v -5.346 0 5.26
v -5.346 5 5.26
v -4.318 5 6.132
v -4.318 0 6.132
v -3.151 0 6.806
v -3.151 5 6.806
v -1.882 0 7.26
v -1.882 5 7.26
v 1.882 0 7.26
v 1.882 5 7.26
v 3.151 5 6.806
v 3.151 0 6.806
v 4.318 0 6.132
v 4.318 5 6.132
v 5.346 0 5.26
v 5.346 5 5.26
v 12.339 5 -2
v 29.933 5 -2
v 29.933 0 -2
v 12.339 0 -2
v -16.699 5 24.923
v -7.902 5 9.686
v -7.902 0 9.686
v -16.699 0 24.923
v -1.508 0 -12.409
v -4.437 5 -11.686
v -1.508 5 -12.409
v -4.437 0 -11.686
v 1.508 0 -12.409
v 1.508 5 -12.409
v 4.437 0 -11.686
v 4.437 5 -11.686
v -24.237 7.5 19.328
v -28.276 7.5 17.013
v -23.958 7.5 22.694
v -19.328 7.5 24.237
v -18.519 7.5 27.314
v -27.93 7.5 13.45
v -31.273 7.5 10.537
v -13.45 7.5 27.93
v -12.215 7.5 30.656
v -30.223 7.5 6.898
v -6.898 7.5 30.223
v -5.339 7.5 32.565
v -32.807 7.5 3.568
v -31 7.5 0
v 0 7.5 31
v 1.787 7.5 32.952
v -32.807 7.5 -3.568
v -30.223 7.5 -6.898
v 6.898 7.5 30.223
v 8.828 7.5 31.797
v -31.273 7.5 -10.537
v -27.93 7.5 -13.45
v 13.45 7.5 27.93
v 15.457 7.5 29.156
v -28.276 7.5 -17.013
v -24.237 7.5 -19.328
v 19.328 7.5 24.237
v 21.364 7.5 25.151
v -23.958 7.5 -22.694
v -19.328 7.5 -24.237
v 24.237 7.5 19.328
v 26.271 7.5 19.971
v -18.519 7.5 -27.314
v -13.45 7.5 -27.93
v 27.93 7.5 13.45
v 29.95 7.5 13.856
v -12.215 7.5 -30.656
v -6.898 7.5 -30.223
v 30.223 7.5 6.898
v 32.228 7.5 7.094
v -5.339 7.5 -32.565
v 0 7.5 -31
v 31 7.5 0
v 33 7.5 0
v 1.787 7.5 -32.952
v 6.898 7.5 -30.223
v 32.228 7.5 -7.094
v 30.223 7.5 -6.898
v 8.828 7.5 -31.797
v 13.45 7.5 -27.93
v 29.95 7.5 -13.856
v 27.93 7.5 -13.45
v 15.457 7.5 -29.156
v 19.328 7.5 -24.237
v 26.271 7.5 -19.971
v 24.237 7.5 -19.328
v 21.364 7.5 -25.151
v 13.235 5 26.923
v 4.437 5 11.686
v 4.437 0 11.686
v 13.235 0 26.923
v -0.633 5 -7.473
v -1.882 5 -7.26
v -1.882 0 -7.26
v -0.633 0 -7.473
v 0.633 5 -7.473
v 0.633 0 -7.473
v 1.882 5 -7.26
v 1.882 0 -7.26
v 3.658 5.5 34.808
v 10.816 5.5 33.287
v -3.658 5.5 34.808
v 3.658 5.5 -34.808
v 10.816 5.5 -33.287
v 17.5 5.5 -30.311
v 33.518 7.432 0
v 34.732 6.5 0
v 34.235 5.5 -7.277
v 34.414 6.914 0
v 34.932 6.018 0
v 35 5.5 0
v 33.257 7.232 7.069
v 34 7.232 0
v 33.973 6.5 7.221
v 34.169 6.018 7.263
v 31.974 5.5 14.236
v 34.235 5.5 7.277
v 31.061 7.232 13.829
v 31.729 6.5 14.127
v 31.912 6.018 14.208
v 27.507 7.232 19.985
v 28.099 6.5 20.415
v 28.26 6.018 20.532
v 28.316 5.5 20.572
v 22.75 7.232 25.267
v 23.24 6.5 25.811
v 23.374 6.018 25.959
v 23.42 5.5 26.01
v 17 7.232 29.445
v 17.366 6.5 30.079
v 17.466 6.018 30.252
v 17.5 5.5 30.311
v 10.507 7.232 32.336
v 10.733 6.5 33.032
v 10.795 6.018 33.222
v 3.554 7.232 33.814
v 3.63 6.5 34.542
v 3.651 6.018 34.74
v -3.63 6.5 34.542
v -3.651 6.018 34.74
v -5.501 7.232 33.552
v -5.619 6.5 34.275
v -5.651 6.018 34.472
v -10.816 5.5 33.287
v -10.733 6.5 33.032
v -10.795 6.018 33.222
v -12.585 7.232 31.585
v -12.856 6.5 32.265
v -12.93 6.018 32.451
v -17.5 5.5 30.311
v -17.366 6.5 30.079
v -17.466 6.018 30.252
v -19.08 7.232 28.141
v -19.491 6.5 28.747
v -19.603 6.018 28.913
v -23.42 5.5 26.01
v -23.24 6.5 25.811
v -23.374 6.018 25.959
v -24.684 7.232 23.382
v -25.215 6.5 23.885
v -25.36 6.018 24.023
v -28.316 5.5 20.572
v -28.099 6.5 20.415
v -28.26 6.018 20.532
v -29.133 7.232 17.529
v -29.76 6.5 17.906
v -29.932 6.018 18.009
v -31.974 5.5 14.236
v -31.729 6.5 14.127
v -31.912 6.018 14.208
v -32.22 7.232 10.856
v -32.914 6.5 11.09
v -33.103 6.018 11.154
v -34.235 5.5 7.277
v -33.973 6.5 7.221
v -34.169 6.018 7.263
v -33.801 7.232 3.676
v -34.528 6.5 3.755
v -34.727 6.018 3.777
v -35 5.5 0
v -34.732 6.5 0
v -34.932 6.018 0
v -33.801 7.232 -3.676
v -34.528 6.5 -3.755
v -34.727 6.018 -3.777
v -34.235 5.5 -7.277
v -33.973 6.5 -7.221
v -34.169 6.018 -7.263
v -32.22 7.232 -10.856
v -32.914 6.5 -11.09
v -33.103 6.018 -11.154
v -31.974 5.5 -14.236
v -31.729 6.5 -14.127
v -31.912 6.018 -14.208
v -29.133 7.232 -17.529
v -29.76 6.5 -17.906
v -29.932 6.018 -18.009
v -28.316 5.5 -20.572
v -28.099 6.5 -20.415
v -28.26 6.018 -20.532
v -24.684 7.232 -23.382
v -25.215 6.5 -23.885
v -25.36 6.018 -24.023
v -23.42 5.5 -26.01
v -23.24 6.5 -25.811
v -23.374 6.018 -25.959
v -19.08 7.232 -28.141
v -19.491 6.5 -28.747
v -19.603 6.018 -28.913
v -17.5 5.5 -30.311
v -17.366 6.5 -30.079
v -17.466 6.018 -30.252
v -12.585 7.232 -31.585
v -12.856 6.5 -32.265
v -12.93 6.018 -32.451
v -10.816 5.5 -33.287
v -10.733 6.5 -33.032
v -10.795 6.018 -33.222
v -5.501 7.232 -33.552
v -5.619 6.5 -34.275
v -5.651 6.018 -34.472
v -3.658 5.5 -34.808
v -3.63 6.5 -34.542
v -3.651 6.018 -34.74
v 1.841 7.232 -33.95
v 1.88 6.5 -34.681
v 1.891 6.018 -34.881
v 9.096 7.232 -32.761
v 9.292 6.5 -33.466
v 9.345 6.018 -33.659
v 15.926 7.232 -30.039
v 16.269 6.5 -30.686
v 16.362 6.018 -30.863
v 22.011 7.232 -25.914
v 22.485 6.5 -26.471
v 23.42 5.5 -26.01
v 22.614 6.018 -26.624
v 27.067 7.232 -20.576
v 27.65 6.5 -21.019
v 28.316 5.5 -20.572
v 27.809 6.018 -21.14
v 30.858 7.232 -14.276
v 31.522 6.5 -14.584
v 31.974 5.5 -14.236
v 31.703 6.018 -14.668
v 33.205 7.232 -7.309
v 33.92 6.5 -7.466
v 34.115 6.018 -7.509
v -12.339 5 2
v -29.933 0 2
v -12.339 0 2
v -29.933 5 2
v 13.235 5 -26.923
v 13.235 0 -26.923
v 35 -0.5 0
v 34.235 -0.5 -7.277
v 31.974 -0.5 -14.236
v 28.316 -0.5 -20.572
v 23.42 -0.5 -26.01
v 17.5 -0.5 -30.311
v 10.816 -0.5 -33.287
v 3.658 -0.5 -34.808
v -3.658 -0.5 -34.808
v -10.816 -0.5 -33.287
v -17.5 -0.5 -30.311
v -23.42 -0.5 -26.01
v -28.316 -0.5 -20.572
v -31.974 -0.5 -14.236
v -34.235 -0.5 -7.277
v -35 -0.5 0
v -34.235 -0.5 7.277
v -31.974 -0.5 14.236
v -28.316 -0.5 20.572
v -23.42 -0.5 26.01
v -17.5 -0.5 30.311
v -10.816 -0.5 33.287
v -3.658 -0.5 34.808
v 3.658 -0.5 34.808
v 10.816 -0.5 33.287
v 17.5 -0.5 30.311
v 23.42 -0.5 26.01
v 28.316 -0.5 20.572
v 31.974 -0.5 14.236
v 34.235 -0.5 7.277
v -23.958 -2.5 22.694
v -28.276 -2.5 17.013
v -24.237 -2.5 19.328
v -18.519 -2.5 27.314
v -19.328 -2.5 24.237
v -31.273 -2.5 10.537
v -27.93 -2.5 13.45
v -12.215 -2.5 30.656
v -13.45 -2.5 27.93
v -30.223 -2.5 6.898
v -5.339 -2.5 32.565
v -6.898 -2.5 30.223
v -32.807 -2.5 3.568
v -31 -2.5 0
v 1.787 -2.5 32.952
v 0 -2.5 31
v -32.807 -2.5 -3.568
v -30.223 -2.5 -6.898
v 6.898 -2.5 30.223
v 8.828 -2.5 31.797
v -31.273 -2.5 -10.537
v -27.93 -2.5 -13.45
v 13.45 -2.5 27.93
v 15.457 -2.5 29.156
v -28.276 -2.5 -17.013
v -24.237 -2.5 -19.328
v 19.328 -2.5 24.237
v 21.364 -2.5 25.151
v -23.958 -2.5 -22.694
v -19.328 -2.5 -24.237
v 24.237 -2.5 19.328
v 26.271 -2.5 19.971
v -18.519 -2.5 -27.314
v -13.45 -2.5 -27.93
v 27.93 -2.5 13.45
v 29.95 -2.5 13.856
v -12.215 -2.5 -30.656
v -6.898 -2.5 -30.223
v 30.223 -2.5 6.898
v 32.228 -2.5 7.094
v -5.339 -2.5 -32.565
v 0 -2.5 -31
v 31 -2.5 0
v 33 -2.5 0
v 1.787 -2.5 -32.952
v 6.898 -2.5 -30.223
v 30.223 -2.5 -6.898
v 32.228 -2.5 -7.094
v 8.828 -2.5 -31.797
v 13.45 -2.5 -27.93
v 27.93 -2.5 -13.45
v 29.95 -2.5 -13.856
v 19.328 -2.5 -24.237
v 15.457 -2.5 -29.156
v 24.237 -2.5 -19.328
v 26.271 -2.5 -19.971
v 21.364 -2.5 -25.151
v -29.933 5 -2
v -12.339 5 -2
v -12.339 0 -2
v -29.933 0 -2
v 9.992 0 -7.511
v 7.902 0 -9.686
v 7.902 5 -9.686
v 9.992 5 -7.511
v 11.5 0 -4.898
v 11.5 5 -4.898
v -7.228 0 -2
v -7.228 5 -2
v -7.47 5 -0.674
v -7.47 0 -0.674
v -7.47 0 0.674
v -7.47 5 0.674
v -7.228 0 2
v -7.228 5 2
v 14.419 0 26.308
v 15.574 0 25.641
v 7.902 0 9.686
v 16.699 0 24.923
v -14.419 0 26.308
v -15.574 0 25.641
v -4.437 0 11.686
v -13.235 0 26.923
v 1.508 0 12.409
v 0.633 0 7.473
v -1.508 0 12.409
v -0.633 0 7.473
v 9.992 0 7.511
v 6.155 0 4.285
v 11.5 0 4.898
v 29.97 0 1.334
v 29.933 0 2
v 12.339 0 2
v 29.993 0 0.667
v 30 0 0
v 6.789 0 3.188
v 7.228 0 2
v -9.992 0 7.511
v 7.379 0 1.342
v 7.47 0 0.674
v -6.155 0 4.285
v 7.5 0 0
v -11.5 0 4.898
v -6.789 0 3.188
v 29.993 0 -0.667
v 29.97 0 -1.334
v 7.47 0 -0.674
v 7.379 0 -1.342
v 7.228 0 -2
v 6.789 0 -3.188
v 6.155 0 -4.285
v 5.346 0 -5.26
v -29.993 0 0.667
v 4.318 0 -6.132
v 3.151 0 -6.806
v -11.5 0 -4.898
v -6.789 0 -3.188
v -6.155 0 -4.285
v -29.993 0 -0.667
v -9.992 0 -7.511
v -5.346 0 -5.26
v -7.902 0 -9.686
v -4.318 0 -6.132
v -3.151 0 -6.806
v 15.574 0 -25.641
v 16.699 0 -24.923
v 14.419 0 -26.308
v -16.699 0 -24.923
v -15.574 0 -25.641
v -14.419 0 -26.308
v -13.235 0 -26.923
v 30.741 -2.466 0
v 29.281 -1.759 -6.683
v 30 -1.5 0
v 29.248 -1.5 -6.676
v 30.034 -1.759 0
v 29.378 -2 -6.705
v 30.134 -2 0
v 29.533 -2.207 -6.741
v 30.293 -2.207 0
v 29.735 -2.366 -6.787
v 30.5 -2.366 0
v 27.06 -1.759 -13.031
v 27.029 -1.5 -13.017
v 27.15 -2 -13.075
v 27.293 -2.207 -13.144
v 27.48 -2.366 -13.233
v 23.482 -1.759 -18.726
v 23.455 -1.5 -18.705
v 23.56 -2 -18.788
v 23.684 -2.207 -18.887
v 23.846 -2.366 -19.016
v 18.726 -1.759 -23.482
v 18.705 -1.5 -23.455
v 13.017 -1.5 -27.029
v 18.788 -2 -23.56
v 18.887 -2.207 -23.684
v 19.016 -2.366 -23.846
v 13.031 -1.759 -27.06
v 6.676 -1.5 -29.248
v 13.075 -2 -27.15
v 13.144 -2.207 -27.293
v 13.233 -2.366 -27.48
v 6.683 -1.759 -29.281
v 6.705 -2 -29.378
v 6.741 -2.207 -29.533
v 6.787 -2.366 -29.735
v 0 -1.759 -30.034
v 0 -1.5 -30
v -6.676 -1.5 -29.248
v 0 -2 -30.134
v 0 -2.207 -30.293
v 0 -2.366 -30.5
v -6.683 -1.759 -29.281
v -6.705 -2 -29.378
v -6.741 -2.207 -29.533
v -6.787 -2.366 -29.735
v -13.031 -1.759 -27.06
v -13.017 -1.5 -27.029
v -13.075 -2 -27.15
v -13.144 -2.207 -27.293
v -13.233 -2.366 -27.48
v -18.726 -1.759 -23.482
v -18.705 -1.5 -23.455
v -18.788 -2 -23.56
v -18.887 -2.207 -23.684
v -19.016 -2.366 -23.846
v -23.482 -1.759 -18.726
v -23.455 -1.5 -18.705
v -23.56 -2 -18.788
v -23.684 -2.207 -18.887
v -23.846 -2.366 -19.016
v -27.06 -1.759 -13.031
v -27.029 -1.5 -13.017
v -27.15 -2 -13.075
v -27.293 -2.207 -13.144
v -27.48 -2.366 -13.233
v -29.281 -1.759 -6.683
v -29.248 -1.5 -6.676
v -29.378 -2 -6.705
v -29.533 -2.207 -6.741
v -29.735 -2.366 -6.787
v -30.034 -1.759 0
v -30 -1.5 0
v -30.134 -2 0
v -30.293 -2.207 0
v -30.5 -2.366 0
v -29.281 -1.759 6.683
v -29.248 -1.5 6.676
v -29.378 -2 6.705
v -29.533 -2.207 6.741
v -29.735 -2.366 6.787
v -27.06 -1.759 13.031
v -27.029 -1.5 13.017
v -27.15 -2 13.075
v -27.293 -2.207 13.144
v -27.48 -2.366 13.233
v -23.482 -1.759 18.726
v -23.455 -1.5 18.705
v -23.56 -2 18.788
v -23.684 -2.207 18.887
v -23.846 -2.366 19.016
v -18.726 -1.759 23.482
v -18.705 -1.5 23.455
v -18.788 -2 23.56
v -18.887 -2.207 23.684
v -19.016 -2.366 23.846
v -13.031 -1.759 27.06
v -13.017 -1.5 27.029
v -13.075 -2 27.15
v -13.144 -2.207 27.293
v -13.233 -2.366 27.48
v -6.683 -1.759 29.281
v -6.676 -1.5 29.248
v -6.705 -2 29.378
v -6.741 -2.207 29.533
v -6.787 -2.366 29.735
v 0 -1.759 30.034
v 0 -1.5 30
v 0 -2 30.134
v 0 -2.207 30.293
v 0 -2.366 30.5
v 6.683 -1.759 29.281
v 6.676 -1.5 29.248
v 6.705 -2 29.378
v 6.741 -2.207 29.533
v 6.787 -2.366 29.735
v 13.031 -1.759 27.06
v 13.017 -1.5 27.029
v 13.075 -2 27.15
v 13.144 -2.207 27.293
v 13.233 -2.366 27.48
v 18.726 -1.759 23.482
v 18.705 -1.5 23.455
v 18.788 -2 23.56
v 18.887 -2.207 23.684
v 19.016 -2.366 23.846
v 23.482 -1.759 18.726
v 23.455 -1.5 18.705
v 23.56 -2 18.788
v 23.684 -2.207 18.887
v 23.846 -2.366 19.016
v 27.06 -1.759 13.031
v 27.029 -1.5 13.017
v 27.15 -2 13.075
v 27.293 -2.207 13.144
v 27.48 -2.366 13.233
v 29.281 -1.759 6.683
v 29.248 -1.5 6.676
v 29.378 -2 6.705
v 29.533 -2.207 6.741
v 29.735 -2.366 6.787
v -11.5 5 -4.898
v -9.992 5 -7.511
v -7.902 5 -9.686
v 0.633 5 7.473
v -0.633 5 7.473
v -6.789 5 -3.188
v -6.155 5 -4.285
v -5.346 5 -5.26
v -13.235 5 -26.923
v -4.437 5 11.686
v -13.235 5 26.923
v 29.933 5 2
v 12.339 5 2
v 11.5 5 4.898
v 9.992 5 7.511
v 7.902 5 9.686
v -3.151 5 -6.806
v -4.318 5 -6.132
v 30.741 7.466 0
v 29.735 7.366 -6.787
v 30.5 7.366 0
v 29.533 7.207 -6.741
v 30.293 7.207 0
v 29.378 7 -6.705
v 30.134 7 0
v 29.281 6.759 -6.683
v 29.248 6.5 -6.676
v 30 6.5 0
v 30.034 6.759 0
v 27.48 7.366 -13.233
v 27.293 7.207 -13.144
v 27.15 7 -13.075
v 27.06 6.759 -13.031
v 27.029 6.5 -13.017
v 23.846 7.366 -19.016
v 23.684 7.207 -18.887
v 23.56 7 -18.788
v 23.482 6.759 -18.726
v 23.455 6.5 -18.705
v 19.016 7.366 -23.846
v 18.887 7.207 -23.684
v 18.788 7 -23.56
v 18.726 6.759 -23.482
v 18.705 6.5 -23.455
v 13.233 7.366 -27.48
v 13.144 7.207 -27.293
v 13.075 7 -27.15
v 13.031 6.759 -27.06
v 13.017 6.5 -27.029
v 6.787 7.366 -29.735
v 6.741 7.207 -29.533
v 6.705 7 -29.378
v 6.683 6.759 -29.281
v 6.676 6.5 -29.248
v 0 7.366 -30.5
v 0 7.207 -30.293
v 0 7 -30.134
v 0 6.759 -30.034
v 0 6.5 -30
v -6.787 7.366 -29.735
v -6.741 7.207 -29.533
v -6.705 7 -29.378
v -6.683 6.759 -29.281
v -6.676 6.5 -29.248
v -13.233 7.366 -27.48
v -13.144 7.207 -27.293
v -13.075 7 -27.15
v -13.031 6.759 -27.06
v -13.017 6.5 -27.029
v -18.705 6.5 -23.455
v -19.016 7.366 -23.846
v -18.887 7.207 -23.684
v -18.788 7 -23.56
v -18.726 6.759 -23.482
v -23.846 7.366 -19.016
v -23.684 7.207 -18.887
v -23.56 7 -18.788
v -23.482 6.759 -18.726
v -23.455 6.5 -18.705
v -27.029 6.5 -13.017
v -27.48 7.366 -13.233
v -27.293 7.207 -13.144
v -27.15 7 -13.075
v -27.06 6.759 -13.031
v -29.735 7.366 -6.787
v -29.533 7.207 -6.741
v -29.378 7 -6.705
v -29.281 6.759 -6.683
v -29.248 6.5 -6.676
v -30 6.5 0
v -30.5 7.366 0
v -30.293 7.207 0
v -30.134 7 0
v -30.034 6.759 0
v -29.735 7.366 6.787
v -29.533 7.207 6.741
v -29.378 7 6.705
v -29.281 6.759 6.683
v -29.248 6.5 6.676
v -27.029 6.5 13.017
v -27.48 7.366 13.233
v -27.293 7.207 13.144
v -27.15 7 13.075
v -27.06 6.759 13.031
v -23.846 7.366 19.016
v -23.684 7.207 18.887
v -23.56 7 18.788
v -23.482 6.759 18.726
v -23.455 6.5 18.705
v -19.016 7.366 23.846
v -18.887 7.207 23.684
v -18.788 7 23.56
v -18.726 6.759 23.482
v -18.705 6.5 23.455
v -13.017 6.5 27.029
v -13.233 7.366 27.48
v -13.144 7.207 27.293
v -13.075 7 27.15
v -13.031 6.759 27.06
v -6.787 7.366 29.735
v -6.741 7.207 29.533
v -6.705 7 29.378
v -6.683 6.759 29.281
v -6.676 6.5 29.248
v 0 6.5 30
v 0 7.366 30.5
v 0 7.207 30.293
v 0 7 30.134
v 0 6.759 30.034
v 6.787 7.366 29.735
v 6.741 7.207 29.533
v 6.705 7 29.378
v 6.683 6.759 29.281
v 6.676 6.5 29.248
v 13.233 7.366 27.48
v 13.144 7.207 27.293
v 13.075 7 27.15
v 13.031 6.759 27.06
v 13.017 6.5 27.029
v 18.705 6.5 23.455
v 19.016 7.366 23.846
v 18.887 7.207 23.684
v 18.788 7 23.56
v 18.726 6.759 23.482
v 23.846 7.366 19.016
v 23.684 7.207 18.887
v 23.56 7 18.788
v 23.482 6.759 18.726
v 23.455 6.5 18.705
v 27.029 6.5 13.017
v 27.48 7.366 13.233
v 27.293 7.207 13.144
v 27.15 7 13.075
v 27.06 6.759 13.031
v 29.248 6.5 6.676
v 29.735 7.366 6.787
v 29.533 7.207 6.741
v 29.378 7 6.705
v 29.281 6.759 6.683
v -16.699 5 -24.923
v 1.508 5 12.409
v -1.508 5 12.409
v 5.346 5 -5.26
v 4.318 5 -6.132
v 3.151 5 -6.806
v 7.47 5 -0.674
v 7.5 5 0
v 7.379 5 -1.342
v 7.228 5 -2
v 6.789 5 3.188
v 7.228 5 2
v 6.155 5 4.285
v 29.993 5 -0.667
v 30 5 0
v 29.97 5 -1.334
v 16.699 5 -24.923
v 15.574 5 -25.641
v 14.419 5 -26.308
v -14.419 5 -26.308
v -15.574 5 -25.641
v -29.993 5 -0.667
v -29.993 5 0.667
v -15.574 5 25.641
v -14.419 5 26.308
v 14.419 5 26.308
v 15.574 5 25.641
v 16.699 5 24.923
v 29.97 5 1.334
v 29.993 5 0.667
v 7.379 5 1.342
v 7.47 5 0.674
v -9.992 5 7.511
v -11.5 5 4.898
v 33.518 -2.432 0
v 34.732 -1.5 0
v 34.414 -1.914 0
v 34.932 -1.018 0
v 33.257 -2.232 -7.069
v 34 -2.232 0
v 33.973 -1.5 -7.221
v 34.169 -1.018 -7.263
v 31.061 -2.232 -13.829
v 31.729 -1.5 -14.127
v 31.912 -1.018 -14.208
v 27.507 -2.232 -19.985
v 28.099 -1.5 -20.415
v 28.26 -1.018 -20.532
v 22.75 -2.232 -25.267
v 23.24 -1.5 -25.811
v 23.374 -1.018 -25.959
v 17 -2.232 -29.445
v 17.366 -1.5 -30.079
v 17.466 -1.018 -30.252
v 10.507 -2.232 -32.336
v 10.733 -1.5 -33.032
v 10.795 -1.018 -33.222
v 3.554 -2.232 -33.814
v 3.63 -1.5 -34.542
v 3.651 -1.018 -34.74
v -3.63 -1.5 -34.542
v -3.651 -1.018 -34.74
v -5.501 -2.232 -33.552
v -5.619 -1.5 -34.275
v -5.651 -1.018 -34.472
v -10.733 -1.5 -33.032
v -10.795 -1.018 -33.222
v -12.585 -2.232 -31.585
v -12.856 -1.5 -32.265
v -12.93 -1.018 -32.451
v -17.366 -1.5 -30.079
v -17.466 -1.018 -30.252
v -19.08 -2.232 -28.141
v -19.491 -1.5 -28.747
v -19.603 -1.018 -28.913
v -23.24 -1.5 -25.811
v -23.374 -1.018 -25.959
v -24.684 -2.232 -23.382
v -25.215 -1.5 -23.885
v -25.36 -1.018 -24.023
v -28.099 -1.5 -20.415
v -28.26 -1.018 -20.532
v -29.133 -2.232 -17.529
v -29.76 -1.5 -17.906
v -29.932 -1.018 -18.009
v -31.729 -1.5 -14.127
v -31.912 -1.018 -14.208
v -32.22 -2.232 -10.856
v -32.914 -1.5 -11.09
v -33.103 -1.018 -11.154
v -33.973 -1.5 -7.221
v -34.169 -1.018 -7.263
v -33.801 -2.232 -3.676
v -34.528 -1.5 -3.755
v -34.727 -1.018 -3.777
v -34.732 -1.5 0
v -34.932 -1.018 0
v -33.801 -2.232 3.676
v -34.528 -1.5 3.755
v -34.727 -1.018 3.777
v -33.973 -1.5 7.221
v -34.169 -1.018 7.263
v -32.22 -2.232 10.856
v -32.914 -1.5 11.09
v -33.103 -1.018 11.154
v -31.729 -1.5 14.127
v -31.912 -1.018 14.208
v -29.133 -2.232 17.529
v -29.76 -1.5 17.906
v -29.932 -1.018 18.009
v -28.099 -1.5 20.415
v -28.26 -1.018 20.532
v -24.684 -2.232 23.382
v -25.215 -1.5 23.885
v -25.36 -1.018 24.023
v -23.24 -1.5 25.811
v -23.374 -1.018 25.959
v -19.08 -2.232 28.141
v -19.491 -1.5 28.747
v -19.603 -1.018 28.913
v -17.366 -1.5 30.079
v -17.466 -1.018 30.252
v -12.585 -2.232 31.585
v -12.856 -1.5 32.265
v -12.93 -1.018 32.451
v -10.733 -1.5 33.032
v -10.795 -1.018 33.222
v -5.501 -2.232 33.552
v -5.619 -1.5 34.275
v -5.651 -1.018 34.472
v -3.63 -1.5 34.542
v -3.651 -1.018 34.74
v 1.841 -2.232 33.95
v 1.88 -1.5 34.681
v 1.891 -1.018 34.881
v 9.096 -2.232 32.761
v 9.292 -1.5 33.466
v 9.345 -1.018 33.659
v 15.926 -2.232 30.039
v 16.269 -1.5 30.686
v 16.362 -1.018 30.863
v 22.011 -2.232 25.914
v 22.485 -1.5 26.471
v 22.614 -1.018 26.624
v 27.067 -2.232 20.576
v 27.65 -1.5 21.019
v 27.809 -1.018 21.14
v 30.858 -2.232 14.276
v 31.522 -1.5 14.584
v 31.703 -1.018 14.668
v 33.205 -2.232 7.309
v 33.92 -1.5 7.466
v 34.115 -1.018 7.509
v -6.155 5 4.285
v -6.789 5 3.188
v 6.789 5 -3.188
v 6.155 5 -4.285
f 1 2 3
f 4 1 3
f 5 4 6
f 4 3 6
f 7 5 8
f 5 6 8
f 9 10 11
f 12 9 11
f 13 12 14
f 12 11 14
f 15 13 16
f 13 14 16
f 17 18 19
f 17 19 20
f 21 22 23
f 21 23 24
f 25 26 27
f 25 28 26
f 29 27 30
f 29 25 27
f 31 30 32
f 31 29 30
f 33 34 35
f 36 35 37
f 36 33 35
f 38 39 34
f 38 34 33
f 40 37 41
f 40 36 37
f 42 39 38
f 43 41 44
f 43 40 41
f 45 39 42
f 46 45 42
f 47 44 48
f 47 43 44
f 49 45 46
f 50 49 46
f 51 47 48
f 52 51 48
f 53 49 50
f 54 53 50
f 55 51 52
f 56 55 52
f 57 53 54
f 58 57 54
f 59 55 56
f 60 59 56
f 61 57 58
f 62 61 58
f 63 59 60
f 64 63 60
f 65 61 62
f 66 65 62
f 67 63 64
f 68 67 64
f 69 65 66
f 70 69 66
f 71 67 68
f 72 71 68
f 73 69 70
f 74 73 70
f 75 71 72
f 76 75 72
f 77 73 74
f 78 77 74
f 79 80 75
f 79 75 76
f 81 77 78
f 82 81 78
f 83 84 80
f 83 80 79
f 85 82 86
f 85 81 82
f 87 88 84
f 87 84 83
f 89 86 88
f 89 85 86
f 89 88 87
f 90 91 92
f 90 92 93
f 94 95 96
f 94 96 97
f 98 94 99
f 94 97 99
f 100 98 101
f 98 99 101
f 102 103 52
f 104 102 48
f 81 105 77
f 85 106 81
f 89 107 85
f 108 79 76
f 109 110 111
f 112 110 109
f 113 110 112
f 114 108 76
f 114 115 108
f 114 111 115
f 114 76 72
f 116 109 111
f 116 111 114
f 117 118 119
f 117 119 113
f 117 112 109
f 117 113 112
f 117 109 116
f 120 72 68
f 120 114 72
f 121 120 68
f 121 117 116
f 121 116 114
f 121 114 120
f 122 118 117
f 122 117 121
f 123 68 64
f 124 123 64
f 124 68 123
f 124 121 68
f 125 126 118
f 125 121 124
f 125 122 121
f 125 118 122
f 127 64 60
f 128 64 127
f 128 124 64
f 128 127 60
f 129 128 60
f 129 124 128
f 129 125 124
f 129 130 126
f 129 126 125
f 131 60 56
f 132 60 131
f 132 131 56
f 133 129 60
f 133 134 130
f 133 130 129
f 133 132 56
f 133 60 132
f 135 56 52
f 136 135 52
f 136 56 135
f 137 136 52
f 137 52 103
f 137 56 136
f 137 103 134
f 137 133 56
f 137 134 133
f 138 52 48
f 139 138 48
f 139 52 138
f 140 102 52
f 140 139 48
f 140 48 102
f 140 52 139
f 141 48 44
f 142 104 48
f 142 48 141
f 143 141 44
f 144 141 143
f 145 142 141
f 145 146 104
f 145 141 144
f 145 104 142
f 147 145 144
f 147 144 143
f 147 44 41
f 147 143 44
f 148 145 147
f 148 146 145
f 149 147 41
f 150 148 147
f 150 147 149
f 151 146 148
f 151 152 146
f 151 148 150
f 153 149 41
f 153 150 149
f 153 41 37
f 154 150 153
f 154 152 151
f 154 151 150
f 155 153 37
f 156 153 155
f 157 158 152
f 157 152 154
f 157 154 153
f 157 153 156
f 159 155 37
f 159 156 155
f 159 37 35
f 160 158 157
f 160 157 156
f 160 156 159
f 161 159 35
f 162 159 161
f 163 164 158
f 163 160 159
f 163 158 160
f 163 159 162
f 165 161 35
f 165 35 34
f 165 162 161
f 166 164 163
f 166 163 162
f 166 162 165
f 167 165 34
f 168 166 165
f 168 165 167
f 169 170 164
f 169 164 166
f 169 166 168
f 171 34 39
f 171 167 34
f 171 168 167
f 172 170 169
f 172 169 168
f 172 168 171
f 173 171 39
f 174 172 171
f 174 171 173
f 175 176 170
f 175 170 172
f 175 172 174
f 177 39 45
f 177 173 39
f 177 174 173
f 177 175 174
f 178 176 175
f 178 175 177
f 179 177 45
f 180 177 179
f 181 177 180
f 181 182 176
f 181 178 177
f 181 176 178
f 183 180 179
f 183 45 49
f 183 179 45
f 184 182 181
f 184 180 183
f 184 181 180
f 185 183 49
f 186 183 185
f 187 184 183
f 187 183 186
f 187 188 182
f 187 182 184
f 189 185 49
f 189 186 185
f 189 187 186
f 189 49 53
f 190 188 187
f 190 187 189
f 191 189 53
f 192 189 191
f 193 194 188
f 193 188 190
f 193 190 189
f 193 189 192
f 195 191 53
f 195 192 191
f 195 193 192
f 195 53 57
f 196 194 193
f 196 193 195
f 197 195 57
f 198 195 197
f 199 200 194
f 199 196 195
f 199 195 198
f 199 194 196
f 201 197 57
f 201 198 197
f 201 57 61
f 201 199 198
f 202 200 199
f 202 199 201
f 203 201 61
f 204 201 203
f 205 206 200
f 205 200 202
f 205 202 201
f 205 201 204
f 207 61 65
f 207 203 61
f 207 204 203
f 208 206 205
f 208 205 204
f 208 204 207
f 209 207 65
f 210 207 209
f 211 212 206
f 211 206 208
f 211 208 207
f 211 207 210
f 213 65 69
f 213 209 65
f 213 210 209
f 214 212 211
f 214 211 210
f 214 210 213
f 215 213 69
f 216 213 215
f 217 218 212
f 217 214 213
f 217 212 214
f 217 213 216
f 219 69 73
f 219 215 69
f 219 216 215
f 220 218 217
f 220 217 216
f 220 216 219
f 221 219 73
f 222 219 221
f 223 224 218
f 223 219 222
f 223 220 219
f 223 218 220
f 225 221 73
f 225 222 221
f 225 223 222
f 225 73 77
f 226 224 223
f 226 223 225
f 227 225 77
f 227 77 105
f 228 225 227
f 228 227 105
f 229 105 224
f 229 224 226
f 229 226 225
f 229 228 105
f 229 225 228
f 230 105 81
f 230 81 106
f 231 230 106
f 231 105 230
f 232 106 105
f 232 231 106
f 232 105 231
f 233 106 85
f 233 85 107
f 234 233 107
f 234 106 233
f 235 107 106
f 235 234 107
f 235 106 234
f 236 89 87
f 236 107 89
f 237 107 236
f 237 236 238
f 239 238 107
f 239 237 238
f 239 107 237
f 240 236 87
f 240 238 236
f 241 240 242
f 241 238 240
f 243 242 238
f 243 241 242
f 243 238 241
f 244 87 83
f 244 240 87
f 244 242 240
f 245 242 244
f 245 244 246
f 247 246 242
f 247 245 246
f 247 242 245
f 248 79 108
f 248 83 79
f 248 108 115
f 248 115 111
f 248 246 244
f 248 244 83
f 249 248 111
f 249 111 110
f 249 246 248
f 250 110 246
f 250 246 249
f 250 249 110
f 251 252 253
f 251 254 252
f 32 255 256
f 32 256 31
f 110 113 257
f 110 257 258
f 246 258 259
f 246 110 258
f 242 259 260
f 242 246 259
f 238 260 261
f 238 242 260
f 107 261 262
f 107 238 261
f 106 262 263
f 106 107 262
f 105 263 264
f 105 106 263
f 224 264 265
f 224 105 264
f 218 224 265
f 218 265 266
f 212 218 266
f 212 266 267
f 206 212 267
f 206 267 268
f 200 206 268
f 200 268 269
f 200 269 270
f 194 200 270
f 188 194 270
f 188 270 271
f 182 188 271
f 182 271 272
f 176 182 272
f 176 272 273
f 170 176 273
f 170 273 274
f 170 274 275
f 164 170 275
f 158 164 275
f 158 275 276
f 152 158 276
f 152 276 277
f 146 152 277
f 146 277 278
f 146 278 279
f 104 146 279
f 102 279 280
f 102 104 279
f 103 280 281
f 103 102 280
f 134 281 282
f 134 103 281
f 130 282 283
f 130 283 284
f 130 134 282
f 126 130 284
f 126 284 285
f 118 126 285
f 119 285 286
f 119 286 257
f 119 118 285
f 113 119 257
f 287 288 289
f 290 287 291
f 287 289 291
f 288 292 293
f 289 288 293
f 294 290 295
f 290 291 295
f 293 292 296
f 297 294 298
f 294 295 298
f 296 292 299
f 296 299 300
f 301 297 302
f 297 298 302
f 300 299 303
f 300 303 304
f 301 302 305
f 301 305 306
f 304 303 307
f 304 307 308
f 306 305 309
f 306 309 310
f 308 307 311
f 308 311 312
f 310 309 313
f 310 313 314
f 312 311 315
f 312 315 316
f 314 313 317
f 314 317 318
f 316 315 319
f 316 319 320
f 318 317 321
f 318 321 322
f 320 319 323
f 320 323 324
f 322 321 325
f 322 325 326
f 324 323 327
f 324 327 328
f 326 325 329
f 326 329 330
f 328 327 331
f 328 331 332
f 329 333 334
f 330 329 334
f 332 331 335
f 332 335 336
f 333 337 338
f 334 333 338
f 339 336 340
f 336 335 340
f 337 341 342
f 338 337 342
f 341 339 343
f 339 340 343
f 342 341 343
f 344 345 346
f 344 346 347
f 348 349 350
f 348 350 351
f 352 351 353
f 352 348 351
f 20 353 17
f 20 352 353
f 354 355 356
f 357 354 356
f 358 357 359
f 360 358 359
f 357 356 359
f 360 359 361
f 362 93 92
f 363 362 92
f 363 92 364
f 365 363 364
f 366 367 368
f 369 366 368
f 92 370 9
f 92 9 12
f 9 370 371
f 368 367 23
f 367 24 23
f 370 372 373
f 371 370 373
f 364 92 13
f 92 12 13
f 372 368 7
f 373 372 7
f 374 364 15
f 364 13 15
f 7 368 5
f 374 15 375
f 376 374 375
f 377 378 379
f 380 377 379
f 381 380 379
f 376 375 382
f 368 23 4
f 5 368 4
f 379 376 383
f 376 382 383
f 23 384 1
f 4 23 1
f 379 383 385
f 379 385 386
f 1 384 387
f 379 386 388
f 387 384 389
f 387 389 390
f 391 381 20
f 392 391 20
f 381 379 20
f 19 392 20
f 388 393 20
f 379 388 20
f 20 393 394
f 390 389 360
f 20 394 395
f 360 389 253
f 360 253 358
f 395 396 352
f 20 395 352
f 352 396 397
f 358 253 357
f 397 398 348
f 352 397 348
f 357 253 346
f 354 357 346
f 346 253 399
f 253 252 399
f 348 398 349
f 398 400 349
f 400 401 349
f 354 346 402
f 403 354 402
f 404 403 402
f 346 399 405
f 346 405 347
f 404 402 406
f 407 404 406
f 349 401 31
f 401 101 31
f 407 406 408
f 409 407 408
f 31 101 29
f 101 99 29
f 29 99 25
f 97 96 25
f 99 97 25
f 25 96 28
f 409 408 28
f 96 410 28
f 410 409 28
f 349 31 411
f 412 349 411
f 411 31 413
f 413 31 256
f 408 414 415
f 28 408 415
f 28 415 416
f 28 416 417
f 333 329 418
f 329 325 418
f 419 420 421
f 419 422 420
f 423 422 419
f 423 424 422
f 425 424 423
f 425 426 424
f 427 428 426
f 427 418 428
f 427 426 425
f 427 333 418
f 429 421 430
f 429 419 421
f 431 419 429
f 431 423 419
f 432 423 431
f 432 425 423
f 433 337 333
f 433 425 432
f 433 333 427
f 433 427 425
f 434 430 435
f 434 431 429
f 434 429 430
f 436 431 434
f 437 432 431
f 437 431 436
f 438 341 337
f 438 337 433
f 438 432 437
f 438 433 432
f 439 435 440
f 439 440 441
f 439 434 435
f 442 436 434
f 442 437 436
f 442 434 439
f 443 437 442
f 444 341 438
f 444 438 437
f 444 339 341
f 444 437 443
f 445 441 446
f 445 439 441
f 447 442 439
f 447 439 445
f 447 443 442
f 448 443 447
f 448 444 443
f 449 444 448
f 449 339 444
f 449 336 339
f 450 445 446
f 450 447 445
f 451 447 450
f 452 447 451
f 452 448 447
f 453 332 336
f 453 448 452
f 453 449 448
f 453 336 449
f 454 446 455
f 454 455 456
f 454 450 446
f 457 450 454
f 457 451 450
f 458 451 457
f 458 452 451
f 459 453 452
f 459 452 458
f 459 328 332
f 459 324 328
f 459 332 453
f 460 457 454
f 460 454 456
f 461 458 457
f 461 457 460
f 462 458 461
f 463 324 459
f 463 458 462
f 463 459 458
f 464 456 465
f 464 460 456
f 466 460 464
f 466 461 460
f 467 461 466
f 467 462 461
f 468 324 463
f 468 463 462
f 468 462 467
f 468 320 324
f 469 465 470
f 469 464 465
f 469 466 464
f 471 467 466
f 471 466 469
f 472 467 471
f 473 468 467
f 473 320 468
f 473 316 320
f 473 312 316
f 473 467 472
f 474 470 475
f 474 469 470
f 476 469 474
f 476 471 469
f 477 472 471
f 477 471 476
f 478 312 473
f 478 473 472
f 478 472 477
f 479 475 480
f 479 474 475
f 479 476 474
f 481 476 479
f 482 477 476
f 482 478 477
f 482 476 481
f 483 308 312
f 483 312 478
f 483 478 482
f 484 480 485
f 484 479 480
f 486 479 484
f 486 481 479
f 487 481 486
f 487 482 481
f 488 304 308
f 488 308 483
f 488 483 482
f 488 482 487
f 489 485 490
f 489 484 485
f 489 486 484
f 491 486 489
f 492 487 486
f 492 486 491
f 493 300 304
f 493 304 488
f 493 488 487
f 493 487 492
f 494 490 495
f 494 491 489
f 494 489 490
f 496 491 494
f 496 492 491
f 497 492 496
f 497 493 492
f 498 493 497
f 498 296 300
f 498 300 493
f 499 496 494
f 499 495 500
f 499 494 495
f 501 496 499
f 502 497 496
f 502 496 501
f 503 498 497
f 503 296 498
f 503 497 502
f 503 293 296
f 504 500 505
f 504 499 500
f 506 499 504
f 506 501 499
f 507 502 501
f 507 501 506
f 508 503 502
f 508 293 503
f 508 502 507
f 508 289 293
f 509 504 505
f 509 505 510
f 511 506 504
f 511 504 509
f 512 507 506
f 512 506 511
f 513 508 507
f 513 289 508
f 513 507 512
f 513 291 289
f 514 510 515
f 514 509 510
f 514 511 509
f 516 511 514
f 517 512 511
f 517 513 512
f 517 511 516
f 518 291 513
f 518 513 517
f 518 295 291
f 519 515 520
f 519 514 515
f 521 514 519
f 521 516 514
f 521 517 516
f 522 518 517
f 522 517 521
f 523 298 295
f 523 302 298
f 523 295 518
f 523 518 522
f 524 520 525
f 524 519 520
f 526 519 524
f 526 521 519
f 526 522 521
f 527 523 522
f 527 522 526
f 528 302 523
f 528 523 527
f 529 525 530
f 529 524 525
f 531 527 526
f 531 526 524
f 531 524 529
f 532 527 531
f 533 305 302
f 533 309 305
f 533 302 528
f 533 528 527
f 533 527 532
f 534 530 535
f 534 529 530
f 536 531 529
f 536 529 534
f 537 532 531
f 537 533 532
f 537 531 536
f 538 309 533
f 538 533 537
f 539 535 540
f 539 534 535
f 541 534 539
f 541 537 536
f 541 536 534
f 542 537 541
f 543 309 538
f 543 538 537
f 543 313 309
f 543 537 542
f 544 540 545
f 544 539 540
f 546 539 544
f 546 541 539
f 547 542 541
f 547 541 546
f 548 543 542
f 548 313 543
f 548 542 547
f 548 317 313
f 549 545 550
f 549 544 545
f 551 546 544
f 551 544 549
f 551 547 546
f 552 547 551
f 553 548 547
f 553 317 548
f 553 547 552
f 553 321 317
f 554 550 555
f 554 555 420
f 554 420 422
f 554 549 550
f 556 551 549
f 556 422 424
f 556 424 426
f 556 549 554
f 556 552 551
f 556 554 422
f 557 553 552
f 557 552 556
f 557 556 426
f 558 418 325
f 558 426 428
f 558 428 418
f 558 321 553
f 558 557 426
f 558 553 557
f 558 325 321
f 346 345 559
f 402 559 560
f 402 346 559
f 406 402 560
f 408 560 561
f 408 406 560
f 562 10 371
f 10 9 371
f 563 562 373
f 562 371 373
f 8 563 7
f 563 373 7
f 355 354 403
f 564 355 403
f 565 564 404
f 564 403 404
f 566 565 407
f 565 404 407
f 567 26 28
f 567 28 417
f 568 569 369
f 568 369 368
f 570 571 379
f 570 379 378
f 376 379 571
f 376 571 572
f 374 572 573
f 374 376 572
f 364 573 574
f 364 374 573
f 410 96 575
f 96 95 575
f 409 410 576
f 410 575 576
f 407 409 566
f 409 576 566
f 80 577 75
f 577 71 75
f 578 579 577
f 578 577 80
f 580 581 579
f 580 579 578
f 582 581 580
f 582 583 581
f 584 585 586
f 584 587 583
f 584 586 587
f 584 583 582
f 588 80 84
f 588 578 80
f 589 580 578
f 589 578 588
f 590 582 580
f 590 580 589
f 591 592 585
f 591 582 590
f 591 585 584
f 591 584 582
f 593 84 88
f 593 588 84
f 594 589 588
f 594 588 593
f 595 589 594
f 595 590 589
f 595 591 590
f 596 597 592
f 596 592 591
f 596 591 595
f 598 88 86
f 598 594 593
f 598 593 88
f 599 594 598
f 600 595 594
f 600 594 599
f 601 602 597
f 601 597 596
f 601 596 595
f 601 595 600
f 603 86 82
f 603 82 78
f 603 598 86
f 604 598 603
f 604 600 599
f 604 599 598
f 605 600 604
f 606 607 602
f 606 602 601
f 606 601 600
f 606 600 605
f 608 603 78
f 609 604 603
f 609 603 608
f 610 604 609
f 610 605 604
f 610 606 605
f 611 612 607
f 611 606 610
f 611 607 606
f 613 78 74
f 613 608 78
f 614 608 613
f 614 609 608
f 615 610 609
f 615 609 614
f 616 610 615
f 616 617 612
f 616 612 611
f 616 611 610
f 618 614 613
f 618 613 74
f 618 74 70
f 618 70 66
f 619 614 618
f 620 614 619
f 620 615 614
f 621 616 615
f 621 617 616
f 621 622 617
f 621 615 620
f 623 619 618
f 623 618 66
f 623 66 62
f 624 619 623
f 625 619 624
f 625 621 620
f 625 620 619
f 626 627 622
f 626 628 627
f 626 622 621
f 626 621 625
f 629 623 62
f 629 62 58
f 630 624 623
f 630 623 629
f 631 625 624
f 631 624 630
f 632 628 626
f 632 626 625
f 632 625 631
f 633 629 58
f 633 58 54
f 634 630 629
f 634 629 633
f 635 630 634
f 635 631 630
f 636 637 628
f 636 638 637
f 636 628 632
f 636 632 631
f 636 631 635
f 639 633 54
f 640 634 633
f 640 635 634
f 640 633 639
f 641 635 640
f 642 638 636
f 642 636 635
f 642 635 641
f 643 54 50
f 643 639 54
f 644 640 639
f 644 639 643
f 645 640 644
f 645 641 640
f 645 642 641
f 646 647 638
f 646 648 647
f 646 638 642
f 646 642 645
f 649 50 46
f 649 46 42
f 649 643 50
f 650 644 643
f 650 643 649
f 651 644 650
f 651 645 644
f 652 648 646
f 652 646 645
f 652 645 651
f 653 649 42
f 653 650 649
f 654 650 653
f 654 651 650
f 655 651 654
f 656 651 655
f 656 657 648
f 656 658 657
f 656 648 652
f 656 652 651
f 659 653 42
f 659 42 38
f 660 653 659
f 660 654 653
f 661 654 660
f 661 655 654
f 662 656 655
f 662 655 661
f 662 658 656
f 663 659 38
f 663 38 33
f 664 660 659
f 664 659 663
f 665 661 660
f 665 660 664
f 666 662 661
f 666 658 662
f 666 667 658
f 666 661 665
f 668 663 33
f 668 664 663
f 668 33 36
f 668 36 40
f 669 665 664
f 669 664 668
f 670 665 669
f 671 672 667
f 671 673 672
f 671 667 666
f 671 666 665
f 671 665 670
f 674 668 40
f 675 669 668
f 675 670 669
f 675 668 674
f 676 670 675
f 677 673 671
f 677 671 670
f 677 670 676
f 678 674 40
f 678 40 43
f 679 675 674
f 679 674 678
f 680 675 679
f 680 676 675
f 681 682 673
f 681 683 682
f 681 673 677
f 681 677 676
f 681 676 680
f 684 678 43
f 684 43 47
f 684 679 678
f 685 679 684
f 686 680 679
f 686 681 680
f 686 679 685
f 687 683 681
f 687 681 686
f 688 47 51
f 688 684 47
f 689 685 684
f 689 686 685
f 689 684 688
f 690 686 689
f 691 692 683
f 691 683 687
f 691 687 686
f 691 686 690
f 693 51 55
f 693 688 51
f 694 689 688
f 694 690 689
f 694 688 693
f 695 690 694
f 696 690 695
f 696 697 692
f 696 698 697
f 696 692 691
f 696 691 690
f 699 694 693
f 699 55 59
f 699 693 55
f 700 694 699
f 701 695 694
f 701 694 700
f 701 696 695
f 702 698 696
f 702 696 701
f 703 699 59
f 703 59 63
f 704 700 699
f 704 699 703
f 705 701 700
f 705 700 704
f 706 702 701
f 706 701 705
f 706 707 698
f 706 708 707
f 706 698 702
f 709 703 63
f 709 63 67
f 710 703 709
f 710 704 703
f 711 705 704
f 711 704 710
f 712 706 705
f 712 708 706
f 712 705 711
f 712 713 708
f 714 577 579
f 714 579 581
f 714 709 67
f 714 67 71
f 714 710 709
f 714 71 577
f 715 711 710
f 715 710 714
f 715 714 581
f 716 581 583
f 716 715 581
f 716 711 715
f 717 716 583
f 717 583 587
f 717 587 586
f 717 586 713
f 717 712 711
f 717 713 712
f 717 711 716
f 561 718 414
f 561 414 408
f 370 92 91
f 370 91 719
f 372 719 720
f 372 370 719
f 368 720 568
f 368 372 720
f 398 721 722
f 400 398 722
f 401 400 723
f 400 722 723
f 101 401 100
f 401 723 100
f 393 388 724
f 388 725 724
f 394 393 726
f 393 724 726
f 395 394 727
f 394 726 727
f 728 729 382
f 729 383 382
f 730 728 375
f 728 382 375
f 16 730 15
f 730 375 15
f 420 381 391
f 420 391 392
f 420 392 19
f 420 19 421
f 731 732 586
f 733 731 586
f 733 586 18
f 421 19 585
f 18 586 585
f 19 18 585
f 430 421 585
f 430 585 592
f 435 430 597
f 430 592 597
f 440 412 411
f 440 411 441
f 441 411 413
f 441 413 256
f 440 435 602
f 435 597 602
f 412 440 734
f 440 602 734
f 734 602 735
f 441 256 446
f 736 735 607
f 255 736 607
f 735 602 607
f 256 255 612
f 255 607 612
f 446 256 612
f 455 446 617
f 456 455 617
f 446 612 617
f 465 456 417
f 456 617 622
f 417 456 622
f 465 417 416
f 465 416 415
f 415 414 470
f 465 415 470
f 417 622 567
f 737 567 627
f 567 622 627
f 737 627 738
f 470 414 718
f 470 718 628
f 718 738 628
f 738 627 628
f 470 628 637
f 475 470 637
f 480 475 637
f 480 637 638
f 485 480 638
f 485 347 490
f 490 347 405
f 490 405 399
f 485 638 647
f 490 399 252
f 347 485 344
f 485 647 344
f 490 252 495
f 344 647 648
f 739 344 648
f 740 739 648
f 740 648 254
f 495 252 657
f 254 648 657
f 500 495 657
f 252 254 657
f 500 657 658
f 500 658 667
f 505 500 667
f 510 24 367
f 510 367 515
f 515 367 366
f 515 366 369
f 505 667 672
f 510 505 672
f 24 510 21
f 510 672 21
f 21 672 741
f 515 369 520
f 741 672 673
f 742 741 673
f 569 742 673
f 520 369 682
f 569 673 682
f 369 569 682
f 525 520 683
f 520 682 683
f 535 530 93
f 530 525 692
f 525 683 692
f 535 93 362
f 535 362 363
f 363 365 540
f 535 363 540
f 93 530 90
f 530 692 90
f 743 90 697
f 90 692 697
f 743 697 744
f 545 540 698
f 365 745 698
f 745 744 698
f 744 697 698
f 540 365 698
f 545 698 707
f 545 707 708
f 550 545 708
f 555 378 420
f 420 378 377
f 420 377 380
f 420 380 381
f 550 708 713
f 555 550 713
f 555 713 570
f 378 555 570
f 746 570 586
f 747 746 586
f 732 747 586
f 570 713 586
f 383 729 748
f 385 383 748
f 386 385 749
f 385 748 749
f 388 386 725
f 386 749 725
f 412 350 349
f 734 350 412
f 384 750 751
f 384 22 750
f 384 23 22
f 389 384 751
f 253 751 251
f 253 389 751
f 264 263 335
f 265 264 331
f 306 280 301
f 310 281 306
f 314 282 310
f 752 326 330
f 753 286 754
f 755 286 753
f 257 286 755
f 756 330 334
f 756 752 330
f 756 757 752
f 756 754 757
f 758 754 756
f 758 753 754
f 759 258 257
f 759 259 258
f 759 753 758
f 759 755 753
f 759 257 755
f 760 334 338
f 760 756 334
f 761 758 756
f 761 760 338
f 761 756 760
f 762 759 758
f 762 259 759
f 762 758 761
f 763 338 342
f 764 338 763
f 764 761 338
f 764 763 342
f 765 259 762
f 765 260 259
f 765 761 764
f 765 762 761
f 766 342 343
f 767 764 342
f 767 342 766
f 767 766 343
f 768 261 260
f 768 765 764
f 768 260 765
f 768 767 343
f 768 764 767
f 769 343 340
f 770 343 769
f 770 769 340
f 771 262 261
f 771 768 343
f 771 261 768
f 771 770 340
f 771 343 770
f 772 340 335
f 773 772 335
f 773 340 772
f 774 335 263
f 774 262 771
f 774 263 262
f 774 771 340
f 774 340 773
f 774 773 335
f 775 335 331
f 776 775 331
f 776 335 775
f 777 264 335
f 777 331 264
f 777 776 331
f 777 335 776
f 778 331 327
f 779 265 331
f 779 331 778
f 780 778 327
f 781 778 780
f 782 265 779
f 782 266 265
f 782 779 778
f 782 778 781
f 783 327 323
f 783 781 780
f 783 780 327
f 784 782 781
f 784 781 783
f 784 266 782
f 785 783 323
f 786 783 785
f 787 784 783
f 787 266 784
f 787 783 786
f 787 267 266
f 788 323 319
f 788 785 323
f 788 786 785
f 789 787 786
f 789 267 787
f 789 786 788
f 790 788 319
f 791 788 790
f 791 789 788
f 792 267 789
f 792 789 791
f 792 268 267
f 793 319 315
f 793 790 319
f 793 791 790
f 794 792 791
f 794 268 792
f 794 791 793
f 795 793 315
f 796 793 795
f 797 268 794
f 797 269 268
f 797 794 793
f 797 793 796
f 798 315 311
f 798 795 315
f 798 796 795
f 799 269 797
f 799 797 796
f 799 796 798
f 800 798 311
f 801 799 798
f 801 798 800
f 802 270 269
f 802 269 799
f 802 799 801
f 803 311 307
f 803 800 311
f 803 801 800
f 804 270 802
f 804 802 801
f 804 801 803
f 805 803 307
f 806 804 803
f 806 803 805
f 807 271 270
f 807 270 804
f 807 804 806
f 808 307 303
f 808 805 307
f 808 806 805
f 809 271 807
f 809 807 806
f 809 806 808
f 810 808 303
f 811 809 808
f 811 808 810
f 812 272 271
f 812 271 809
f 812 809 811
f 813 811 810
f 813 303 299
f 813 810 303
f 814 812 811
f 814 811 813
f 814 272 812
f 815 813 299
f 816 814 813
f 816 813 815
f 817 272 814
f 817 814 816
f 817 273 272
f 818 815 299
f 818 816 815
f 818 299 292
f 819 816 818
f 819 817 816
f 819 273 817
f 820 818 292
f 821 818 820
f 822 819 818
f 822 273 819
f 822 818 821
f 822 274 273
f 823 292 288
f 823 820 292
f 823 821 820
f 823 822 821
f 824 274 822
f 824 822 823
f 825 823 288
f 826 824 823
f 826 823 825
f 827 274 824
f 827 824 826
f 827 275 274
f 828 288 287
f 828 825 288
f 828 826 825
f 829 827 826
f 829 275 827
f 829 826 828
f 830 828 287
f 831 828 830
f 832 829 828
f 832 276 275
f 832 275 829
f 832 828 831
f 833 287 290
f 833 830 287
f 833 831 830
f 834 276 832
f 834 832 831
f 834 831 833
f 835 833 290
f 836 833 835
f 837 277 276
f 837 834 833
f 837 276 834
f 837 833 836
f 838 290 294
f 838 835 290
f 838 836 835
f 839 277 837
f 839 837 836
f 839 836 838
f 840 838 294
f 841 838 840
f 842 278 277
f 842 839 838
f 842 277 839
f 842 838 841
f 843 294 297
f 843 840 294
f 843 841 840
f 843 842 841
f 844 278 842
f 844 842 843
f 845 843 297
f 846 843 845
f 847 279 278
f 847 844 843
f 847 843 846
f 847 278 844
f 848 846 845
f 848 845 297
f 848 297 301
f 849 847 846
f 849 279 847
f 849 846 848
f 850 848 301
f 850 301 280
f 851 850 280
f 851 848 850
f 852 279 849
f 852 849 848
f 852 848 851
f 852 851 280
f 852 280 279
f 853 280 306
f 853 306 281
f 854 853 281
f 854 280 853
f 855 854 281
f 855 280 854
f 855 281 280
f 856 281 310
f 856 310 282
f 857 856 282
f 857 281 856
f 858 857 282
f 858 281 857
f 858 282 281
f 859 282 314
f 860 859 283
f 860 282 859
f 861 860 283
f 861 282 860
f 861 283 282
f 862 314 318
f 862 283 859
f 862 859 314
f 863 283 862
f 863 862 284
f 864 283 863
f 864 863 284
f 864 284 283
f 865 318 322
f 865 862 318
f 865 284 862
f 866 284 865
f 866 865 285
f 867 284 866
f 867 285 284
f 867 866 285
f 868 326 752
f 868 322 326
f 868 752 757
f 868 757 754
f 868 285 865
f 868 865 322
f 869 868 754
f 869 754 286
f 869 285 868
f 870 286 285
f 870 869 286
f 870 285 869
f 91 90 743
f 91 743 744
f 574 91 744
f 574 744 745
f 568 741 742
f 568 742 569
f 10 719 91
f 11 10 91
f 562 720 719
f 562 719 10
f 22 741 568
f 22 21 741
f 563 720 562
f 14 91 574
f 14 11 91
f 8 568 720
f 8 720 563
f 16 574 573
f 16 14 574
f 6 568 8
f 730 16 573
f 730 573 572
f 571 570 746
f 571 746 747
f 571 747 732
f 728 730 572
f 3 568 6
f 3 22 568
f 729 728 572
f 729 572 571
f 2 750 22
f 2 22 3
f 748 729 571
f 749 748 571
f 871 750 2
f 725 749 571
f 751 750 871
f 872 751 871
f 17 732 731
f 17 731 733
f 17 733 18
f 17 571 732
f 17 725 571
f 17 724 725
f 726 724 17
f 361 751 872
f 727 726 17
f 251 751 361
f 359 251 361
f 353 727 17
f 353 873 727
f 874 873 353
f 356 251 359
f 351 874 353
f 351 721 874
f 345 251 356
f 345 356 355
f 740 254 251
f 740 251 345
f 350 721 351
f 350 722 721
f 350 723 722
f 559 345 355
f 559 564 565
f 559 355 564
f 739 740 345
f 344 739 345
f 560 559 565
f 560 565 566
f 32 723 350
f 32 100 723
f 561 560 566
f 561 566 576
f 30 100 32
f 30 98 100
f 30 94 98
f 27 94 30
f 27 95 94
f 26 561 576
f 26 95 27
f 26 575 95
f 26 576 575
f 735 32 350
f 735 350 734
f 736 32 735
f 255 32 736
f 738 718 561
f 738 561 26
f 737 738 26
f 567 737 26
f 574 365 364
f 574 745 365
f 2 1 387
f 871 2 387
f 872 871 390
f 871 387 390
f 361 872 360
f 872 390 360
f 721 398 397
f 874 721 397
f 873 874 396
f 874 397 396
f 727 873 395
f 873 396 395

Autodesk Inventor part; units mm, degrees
ref_plane "YZ Plane" through (0, 0, 0) normal (1, 0, 0) x (0, 1, 0)
ref_plane "XZ Plane" through (0, 0, 0) normal (0, 1, 0) x (-1, 0, 0)
ref_plane "XY Plane" through (0, 0, 0) normal (0, 0, 1) x (1, 0, 0)
sketch "스케치1" plane through (0, 0, 0) normal (0, 1, 0) x (-1, 0, 0)
  circle A0 centre (0, 0) radius 37.5
  circle A1 centre (0, 0) radius 7.5
  circle A2 centre (0, 0) radius 12.5
  line L0 (2, 37.5) -> (-2, 37.5)
  line L1 (-2, 37.5) -> (-2, -37.5)
  line L2 (-2, -37.5) -> (2, -37.5)
  line L3 (2, -37.5) -> (2, 37.5)
  dimension "d0" = 75
  dimension "d1" = 15
  dimension "d2" = 25
  dimension "d3" = 2
  dimension "d4" = 2
  dimension "d5" = 75
  dimension "d6" = 37.5
extrude "돌출1" add sketch "스케치1" along normal blind 5 contours L3 A1 L1 A2 | A2 L3 A1 | A2 L1 A1 L3 | L1 A1 A2
sketch "스케치2" plane through (0, 5, 0) normal (0, 1, 0) x (1, 0, 0)
  circle A0 centre (0, 0) radius 35
  circle A1 centre (0, 0) radius 30
  dimension "d9" = 70
  dimension "d10" = 60
extrude "돌출2" add sketch "스케치2" against normal blind 7.5
sketch "스케치3" plane through (0, 5, 0) normal (0, 1, 0) x (1, 0, 0)
  circle A0 centre (0, 0) radius 30 projected
  circle A1 centre (0, 0) radius 35 projected
extrude "돌출3" add sketch "스케치3" along normal blind 2.5
sketch "스케치4" plane through (0, 5, 0) normal (0, 1, 0) x (1, 0, 0)
  line L0 (-34, -2) -> (34, -2)
  line L1 (34, -2) -> (34, 2)
  line L2 (34, 2) -> (-34, 2)
  line L3 (-34, 2) -> (-34, -2)
  point P0 (0, 0)
  dimension "d15" = 68
  dimension "d16" = 4
  dimension "d17" = 2
  dimension "d18" = 34
extrude "돌출4" add sketch "스케치4" against normal blind 5
pattern_circular "원형 패턴1" count 6 over 360 about axis through (0, 0, 0) along (0, 1, 0) of "돌출4"
sketch "스케치5" plane through (0, 5, 0) normal (0, 1, 0) x (1, 0, 0)
  circle A0 centre (0, 0) radius 7.5
  arc A1 (1.8822, 7.26) -> (-1.8822, 7.26) centre (0, 0) ccw projected
extrude "돌출5" cut sketch "스케치5" against normal blind 5
fillet "모깎기1" radius 2 2 edges at (-35, 7.5, 0) (-35, -2.5, 0)
fillet "모깎기2" radius 1 1 edges at (-30, 7.5, 0)
fillet "모깎기3" radius 1 1 edges at (-30, -2.5, 0)
properties part number "앞바퀴2"
